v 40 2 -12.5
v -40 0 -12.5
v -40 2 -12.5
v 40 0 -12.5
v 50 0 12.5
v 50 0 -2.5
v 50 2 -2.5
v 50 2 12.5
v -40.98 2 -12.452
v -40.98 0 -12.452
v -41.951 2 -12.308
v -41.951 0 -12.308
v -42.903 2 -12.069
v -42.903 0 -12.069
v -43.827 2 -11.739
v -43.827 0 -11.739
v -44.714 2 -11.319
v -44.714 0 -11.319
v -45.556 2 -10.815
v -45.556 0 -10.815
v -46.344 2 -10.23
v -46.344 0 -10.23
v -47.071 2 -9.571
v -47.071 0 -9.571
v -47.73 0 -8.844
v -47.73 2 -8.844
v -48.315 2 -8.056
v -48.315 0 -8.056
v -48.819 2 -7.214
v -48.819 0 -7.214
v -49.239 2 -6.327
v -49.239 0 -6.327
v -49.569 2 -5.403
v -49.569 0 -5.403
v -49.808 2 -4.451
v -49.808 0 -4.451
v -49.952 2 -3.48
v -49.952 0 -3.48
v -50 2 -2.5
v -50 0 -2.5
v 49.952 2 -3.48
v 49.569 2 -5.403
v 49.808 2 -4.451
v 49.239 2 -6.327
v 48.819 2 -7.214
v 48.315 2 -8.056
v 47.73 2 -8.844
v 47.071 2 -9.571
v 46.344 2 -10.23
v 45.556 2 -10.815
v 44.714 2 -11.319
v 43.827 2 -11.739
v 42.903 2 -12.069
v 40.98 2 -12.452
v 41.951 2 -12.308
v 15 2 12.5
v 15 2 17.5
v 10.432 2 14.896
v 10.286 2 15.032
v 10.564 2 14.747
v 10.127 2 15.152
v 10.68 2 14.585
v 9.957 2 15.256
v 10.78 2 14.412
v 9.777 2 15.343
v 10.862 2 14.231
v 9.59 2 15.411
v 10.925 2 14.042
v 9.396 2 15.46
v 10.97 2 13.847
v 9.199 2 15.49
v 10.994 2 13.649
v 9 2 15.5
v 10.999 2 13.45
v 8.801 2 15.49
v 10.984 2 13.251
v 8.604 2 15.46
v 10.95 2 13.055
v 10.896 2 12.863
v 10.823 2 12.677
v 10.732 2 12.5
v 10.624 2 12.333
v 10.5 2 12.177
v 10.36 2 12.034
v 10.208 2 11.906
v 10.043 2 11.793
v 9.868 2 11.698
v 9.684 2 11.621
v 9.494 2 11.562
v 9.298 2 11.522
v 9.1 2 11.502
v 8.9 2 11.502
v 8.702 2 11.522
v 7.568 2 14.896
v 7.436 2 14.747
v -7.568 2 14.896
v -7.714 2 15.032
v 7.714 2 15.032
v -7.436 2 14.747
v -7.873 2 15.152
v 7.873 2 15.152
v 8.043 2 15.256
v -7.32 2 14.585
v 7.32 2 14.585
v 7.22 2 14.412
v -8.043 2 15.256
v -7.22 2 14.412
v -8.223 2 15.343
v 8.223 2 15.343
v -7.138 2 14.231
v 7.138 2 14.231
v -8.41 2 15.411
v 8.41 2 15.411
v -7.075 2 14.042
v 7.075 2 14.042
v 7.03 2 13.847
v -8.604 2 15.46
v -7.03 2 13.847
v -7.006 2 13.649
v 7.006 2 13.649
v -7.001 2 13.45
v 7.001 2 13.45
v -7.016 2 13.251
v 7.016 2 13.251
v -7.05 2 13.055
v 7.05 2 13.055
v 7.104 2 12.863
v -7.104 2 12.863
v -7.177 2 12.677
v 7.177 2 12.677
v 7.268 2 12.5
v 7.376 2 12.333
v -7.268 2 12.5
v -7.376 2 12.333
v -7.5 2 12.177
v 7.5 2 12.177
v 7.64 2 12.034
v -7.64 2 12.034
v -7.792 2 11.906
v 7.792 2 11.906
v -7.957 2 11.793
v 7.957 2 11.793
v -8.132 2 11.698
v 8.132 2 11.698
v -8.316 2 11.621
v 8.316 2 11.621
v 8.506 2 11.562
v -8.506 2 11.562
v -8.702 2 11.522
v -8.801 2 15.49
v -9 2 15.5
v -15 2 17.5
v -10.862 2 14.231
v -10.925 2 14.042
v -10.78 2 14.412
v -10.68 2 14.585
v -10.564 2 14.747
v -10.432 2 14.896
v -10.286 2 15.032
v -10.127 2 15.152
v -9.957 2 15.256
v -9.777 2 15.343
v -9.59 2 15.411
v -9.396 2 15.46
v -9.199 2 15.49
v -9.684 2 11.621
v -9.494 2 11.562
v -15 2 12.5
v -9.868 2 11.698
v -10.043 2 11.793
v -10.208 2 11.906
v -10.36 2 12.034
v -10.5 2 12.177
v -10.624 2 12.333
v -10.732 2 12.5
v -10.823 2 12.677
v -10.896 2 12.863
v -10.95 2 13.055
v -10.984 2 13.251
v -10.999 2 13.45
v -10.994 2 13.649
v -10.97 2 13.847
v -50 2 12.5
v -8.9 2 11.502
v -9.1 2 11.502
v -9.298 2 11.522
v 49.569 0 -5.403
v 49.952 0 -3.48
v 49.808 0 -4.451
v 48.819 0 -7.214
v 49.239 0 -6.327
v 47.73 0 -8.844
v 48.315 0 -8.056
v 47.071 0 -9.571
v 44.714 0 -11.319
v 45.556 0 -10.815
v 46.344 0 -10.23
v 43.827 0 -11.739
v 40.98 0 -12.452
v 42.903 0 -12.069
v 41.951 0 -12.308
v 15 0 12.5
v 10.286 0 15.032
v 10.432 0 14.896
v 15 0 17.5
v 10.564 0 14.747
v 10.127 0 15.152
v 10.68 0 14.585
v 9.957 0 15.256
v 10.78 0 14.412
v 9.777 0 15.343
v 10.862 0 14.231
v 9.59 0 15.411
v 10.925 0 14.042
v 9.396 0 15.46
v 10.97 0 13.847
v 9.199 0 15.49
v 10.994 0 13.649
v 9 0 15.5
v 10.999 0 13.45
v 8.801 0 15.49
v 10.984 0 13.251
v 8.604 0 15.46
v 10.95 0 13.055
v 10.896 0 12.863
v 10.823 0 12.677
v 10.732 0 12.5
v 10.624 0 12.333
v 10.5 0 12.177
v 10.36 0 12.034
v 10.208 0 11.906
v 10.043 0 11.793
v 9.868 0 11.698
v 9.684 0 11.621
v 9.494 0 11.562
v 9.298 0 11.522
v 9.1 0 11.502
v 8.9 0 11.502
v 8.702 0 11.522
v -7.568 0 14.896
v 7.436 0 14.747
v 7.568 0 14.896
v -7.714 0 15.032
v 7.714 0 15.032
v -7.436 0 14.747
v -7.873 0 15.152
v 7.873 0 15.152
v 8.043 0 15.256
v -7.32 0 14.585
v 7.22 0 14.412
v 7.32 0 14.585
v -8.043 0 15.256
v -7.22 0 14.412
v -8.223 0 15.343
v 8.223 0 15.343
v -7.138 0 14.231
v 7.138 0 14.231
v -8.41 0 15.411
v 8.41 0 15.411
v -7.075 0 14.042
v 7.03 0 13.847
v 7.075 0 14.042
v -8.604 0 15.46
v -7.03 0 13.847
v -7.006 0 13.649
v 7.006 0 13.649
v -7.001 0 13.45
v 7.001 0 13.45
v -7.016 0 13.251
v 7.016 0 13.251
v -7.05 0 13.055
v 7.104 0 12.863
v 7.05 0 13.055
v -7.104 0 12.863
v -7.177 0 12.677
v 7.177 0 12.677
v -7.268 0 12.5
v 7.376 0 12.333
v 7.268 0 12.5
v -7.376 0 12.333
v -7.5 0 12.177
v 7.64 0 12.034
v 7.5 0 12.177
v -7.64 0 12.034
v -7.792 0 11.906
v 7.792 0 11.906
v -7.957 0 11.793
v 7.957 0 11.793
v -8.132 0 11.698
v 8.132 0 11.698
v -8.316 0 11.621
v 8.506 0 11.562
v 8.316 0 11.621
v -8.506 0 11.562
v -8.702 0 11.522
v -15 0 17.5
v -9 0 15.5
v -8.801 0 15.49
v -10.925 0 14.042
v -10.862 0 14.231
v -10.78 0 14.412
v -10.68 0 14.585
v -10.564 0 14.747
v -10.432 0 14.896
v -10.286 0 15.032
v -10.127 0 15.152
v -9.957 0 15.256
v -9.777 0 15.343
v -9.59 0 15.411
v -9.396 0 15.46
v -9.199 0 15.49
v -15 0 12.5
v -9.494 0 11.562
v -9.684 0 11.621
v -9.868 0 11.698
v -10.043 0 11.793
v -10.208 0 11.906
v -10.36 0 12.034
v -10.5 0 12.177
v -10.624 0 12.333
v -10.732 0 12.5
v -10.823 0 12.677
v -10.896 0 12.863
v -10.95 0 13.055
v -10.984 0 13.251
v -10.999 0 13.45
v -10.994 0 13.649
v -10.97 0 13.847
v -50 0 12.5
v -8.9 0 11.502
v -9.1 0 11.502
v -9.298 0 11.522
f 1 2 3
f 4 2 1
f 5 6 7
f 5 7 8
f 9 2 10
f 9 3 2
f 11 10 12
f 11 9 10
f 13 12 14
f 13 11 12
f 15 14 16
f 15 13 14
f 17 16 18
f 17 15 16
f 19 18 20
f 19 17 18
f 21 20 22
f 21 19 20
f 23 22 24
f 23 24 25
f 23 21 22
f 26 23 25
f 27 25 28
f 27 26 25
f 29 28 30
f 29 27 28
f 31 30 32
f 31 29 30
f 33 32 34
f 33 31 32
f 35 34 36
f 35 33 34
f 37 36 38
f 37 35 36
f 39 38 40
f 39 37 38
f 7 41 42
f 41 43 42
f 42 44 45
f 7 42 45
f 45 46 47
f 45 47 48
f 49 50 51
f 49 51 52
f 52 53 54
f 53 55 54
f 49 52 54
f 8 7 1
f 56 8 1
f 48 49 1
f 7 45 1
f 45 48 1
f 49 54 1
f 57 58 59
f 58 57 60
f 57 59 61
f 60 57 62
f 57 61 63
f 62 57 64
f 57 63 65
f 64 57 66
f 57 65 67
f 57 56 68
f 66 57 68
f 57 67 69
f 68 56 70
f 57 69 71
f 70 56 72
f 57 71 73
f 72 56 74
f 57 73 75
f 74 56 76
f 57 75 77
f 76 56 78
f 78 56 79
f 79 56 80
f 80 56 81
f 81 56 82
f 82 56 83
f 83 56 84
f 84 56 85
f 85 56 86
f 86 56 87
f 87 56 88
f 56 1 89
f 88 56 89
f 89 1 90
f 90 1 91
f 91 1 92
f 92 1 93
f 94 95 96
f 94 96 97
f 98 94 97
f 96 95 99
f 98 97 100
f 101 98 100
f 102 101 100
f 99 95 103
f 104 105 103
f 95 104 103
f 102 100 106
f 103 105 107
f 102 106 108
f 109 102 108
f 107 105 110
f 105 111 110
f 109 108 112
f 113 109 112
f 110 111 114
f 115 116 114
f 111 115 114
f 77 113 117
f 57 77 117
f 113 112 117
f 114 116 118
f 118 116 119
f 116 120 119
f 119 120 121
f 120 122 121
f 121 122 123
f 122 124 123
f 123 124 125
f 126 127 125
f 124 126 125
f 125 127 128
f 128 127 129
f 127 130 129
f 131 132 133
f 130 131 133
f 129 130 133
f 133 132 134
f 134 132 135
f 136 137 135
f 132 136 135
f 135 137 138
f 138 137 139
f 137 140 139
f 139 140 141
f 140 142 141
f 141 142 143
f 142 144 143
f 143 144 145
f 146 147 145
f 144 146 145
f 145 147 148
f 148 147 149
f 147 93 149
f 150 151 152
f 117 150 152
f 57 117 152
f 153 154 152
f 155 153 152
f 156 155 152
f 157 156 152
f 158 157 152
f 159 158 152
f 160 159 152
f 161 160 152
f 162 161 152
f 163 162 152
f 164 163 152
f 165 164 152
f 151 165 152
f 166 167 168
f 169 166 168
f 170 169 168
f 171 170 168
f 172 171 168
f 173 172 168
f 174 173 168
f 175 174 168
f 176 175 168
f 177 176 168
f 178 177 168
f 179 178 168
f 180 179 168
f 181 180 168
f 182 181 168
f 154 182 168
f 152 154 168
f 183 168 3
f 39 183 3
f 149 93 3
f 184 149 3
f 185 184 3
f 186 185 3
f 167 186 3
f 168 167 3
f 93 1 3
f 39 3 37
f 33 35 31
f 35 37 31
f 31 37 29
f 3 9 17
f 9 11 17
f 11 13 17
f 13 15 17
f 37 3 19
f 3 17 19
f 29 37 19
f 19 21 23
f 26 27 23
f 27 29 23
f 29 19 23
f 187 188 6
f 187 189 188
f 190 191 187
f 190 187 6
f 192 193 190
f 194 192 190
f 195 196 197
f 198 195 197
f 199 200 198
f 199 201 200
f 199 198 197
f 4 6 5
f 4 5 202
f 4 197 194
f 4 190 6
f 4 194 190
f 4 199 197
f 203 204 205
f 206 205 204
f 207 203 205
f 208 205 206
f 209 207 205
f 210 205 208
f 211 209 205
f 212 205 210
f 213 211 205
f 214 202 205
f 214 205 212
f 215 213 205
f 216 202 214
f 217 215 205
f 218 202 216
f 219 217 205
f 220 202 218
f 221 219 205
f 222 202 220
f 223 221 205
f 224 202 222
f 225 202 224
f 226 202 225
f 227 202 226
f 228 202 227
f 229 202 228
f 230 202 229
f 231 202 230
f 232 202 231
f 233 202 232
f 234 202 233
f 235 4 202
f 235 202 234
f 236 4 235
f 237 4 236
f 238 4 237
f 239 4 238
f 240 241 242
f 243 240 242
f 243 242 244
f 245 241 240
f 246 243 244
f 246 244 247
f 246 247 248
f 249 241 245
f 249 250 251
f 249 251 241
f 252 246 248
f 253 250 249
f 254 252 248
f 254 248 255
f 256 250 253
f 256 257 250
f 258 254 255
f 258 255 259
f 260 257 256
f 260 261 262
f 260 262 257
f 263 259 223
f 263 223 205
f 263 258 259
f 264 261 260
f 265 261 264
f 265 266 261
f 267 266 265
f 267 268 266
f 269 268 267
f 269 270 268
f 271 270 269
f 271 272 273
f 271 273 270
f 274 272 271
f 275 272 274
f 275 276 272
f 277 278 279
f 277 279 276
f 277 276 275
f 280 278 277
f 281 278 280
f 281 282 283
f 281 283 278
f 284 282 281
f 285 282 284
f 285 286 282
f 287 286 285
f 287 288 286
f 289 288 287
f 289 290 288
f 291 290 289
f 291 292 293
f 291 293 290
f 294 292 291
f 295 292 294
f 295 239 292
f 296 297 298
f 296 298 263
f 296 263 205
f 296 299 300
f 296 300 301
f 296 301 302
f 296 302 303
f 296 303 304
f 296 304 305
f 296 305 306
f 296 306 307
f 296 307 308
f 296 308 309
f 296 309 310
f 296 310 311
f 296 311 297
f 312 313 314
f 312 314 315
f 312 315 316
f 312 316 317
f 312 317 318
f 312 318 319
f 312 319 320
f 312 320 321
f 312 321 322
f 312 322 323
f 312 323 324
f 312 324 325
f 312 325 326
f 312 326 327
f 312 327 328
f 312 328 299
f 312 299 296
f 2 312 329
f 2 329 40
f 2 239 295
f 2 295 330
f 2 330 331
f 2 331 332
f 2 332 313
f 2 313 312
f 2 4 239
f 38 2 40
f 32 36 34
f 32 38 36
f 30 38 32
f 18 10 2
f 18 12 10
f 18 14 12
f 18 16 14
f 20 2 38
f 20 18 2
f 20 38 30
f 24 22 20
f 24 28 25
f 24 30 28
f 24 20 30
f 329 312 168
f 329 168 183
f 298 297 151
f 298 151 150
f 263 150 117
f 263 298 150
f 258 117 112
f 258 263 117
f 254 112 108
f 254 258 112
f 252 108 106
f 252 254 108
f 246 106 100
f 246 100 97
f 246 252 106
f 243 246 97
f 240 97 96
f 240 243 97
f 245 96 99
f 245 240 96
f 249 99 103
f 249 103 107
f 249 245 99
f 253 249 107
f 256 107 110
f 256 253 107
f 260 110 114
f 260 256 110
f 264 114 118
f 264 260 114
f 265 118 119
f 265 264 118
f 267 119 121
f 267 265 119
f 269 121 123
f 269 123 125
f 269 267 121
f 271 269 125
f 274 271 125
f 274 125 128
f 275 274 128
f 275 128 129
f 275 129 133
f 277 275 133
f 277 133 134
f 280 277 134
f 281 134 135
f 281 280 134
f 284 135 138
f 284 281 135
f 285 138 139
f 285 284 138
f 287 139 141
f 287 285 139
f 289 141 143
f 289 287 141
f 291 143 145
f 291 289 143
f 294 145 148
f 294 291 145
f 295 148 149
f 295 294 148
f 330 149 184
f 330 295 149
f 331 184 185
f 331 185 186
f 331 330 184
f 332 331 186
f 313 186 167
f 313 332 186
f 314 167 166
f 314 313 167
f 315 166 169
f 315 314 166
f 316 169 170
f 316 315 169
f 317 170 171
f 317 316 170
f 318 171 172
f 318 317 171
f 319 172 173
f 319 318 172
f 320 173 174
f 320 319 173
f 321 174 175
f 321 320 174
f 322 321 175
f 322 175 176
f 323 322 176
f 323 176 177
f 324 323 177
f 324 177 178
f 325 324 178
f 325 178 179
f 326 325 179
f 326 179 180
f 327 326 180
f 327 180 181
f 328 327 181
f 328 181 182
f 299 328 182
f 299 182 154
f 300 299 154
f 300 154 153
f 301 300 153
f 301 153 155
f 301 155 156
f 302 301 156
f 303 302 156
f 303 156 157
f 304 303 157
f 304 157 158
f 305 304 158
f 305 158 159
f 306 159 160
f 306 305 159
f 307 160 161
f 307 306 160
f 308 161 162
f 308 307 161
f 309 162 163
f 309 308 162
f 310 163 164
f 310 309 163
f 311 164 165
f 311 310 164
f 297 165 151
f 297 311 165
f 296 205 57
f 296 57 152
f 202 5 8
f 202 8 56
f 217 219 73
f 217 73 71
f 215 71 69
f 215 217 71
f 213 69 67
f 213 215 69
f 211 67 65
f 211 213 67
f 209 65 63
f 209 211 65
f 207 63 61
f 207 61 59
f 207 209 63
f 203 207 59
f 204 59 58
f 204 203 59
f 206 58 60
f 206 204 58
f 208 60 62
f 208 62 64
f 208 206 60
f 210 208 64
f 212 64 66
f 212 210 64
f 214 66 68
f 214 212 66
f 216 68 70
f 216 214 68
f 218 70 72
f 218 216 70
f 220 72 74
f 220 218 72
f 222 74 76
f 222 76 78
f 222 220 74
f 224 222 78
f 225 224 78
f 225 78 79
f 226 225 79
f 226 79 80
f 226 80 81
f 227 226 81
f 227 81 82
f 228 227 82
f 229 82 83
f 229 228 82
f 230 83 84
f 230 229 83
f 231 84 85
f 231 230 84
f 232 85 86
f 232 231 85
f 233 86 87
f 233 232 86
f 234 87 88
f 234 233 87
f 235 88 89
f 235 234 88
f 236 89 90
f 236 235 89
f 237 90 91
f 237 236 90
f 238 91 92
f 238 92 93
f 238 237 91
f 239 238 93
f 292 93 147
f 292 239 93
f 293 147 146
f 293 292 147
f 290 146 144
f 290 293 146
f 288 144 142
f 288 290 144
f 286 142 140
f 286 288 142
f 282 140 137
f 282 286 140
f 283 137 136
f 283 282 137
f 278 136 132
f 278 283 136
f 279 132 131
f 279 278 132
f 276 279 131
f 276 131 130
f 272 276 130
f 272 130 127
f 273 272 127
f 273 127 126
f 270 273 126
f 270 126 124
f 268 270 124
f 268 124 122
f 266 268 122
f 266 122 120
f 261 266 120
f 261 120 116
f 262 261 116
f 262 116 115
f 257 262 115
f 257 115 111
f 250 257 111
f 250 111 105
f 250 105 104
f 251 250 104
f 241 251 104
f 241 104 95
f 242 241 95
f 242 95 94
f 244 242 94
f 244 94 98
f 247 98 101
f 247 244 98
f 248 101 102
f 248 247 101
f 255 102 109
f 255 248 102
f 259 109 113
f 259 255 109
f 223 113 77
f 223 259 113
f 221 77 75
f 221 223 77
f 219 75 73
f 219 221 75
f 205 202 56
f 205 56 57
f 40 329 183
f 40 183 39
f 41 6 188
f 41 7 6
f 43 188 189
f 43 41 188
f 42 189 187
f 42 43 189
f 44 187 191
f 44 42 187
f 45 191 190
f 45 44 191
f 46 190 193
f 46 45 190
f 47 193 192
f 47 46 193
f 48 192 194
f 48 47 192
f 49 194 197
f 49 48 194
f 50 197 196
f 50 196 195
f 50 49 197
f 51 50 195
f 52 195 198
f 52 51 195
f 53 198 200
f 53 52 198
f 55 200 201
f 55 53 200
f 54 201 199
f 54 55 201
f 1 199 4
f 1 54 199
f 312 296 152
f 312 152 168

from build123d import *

# Parameters (mm, degrees)
SKETCH1_R           = 2
BOSS_EXTRUDE1_DEPTH = 2
FILLET1_R           = 10


with BuildPart() as part:
    # Sketch1 → Boss-Extrude1 (new body)
    with BuildSketch(Plane(origin=(0, 0, 0), x_dir=(1, 0, 0), z_dir=(0, 1, 0))):
        Polygon((50, 12.5), (50, -12.5), (15, -12.5), (15, -17.5), (-15, -17.5), (-15, -12.5), (-50, -12.5), (-50, 12.5), align=None)
        with Locations(Location((-9, -13.5, 0), (0, 0, 270))):
            Circle(SKETCH1_R, mode=Mode.SUBTRACT)
        with Locations(Location((9, -13.5, 0), (0, 0, 270))):
            Circle(SKETCH1_R, mode=Mode.SUBTRACT)
    extrude(amount=BOSS_EXTRUDE1_DEPTH)

    # Fillet1
    fillet1_edges = [part.edges().sort_by_distance(p)[0] for p in [
        (-50, 1, -12.5),
        (50, 1, -12.5),
    ]]
    fillet(fillet1_edges, radius=FILLET1_R)


solid = part.part
